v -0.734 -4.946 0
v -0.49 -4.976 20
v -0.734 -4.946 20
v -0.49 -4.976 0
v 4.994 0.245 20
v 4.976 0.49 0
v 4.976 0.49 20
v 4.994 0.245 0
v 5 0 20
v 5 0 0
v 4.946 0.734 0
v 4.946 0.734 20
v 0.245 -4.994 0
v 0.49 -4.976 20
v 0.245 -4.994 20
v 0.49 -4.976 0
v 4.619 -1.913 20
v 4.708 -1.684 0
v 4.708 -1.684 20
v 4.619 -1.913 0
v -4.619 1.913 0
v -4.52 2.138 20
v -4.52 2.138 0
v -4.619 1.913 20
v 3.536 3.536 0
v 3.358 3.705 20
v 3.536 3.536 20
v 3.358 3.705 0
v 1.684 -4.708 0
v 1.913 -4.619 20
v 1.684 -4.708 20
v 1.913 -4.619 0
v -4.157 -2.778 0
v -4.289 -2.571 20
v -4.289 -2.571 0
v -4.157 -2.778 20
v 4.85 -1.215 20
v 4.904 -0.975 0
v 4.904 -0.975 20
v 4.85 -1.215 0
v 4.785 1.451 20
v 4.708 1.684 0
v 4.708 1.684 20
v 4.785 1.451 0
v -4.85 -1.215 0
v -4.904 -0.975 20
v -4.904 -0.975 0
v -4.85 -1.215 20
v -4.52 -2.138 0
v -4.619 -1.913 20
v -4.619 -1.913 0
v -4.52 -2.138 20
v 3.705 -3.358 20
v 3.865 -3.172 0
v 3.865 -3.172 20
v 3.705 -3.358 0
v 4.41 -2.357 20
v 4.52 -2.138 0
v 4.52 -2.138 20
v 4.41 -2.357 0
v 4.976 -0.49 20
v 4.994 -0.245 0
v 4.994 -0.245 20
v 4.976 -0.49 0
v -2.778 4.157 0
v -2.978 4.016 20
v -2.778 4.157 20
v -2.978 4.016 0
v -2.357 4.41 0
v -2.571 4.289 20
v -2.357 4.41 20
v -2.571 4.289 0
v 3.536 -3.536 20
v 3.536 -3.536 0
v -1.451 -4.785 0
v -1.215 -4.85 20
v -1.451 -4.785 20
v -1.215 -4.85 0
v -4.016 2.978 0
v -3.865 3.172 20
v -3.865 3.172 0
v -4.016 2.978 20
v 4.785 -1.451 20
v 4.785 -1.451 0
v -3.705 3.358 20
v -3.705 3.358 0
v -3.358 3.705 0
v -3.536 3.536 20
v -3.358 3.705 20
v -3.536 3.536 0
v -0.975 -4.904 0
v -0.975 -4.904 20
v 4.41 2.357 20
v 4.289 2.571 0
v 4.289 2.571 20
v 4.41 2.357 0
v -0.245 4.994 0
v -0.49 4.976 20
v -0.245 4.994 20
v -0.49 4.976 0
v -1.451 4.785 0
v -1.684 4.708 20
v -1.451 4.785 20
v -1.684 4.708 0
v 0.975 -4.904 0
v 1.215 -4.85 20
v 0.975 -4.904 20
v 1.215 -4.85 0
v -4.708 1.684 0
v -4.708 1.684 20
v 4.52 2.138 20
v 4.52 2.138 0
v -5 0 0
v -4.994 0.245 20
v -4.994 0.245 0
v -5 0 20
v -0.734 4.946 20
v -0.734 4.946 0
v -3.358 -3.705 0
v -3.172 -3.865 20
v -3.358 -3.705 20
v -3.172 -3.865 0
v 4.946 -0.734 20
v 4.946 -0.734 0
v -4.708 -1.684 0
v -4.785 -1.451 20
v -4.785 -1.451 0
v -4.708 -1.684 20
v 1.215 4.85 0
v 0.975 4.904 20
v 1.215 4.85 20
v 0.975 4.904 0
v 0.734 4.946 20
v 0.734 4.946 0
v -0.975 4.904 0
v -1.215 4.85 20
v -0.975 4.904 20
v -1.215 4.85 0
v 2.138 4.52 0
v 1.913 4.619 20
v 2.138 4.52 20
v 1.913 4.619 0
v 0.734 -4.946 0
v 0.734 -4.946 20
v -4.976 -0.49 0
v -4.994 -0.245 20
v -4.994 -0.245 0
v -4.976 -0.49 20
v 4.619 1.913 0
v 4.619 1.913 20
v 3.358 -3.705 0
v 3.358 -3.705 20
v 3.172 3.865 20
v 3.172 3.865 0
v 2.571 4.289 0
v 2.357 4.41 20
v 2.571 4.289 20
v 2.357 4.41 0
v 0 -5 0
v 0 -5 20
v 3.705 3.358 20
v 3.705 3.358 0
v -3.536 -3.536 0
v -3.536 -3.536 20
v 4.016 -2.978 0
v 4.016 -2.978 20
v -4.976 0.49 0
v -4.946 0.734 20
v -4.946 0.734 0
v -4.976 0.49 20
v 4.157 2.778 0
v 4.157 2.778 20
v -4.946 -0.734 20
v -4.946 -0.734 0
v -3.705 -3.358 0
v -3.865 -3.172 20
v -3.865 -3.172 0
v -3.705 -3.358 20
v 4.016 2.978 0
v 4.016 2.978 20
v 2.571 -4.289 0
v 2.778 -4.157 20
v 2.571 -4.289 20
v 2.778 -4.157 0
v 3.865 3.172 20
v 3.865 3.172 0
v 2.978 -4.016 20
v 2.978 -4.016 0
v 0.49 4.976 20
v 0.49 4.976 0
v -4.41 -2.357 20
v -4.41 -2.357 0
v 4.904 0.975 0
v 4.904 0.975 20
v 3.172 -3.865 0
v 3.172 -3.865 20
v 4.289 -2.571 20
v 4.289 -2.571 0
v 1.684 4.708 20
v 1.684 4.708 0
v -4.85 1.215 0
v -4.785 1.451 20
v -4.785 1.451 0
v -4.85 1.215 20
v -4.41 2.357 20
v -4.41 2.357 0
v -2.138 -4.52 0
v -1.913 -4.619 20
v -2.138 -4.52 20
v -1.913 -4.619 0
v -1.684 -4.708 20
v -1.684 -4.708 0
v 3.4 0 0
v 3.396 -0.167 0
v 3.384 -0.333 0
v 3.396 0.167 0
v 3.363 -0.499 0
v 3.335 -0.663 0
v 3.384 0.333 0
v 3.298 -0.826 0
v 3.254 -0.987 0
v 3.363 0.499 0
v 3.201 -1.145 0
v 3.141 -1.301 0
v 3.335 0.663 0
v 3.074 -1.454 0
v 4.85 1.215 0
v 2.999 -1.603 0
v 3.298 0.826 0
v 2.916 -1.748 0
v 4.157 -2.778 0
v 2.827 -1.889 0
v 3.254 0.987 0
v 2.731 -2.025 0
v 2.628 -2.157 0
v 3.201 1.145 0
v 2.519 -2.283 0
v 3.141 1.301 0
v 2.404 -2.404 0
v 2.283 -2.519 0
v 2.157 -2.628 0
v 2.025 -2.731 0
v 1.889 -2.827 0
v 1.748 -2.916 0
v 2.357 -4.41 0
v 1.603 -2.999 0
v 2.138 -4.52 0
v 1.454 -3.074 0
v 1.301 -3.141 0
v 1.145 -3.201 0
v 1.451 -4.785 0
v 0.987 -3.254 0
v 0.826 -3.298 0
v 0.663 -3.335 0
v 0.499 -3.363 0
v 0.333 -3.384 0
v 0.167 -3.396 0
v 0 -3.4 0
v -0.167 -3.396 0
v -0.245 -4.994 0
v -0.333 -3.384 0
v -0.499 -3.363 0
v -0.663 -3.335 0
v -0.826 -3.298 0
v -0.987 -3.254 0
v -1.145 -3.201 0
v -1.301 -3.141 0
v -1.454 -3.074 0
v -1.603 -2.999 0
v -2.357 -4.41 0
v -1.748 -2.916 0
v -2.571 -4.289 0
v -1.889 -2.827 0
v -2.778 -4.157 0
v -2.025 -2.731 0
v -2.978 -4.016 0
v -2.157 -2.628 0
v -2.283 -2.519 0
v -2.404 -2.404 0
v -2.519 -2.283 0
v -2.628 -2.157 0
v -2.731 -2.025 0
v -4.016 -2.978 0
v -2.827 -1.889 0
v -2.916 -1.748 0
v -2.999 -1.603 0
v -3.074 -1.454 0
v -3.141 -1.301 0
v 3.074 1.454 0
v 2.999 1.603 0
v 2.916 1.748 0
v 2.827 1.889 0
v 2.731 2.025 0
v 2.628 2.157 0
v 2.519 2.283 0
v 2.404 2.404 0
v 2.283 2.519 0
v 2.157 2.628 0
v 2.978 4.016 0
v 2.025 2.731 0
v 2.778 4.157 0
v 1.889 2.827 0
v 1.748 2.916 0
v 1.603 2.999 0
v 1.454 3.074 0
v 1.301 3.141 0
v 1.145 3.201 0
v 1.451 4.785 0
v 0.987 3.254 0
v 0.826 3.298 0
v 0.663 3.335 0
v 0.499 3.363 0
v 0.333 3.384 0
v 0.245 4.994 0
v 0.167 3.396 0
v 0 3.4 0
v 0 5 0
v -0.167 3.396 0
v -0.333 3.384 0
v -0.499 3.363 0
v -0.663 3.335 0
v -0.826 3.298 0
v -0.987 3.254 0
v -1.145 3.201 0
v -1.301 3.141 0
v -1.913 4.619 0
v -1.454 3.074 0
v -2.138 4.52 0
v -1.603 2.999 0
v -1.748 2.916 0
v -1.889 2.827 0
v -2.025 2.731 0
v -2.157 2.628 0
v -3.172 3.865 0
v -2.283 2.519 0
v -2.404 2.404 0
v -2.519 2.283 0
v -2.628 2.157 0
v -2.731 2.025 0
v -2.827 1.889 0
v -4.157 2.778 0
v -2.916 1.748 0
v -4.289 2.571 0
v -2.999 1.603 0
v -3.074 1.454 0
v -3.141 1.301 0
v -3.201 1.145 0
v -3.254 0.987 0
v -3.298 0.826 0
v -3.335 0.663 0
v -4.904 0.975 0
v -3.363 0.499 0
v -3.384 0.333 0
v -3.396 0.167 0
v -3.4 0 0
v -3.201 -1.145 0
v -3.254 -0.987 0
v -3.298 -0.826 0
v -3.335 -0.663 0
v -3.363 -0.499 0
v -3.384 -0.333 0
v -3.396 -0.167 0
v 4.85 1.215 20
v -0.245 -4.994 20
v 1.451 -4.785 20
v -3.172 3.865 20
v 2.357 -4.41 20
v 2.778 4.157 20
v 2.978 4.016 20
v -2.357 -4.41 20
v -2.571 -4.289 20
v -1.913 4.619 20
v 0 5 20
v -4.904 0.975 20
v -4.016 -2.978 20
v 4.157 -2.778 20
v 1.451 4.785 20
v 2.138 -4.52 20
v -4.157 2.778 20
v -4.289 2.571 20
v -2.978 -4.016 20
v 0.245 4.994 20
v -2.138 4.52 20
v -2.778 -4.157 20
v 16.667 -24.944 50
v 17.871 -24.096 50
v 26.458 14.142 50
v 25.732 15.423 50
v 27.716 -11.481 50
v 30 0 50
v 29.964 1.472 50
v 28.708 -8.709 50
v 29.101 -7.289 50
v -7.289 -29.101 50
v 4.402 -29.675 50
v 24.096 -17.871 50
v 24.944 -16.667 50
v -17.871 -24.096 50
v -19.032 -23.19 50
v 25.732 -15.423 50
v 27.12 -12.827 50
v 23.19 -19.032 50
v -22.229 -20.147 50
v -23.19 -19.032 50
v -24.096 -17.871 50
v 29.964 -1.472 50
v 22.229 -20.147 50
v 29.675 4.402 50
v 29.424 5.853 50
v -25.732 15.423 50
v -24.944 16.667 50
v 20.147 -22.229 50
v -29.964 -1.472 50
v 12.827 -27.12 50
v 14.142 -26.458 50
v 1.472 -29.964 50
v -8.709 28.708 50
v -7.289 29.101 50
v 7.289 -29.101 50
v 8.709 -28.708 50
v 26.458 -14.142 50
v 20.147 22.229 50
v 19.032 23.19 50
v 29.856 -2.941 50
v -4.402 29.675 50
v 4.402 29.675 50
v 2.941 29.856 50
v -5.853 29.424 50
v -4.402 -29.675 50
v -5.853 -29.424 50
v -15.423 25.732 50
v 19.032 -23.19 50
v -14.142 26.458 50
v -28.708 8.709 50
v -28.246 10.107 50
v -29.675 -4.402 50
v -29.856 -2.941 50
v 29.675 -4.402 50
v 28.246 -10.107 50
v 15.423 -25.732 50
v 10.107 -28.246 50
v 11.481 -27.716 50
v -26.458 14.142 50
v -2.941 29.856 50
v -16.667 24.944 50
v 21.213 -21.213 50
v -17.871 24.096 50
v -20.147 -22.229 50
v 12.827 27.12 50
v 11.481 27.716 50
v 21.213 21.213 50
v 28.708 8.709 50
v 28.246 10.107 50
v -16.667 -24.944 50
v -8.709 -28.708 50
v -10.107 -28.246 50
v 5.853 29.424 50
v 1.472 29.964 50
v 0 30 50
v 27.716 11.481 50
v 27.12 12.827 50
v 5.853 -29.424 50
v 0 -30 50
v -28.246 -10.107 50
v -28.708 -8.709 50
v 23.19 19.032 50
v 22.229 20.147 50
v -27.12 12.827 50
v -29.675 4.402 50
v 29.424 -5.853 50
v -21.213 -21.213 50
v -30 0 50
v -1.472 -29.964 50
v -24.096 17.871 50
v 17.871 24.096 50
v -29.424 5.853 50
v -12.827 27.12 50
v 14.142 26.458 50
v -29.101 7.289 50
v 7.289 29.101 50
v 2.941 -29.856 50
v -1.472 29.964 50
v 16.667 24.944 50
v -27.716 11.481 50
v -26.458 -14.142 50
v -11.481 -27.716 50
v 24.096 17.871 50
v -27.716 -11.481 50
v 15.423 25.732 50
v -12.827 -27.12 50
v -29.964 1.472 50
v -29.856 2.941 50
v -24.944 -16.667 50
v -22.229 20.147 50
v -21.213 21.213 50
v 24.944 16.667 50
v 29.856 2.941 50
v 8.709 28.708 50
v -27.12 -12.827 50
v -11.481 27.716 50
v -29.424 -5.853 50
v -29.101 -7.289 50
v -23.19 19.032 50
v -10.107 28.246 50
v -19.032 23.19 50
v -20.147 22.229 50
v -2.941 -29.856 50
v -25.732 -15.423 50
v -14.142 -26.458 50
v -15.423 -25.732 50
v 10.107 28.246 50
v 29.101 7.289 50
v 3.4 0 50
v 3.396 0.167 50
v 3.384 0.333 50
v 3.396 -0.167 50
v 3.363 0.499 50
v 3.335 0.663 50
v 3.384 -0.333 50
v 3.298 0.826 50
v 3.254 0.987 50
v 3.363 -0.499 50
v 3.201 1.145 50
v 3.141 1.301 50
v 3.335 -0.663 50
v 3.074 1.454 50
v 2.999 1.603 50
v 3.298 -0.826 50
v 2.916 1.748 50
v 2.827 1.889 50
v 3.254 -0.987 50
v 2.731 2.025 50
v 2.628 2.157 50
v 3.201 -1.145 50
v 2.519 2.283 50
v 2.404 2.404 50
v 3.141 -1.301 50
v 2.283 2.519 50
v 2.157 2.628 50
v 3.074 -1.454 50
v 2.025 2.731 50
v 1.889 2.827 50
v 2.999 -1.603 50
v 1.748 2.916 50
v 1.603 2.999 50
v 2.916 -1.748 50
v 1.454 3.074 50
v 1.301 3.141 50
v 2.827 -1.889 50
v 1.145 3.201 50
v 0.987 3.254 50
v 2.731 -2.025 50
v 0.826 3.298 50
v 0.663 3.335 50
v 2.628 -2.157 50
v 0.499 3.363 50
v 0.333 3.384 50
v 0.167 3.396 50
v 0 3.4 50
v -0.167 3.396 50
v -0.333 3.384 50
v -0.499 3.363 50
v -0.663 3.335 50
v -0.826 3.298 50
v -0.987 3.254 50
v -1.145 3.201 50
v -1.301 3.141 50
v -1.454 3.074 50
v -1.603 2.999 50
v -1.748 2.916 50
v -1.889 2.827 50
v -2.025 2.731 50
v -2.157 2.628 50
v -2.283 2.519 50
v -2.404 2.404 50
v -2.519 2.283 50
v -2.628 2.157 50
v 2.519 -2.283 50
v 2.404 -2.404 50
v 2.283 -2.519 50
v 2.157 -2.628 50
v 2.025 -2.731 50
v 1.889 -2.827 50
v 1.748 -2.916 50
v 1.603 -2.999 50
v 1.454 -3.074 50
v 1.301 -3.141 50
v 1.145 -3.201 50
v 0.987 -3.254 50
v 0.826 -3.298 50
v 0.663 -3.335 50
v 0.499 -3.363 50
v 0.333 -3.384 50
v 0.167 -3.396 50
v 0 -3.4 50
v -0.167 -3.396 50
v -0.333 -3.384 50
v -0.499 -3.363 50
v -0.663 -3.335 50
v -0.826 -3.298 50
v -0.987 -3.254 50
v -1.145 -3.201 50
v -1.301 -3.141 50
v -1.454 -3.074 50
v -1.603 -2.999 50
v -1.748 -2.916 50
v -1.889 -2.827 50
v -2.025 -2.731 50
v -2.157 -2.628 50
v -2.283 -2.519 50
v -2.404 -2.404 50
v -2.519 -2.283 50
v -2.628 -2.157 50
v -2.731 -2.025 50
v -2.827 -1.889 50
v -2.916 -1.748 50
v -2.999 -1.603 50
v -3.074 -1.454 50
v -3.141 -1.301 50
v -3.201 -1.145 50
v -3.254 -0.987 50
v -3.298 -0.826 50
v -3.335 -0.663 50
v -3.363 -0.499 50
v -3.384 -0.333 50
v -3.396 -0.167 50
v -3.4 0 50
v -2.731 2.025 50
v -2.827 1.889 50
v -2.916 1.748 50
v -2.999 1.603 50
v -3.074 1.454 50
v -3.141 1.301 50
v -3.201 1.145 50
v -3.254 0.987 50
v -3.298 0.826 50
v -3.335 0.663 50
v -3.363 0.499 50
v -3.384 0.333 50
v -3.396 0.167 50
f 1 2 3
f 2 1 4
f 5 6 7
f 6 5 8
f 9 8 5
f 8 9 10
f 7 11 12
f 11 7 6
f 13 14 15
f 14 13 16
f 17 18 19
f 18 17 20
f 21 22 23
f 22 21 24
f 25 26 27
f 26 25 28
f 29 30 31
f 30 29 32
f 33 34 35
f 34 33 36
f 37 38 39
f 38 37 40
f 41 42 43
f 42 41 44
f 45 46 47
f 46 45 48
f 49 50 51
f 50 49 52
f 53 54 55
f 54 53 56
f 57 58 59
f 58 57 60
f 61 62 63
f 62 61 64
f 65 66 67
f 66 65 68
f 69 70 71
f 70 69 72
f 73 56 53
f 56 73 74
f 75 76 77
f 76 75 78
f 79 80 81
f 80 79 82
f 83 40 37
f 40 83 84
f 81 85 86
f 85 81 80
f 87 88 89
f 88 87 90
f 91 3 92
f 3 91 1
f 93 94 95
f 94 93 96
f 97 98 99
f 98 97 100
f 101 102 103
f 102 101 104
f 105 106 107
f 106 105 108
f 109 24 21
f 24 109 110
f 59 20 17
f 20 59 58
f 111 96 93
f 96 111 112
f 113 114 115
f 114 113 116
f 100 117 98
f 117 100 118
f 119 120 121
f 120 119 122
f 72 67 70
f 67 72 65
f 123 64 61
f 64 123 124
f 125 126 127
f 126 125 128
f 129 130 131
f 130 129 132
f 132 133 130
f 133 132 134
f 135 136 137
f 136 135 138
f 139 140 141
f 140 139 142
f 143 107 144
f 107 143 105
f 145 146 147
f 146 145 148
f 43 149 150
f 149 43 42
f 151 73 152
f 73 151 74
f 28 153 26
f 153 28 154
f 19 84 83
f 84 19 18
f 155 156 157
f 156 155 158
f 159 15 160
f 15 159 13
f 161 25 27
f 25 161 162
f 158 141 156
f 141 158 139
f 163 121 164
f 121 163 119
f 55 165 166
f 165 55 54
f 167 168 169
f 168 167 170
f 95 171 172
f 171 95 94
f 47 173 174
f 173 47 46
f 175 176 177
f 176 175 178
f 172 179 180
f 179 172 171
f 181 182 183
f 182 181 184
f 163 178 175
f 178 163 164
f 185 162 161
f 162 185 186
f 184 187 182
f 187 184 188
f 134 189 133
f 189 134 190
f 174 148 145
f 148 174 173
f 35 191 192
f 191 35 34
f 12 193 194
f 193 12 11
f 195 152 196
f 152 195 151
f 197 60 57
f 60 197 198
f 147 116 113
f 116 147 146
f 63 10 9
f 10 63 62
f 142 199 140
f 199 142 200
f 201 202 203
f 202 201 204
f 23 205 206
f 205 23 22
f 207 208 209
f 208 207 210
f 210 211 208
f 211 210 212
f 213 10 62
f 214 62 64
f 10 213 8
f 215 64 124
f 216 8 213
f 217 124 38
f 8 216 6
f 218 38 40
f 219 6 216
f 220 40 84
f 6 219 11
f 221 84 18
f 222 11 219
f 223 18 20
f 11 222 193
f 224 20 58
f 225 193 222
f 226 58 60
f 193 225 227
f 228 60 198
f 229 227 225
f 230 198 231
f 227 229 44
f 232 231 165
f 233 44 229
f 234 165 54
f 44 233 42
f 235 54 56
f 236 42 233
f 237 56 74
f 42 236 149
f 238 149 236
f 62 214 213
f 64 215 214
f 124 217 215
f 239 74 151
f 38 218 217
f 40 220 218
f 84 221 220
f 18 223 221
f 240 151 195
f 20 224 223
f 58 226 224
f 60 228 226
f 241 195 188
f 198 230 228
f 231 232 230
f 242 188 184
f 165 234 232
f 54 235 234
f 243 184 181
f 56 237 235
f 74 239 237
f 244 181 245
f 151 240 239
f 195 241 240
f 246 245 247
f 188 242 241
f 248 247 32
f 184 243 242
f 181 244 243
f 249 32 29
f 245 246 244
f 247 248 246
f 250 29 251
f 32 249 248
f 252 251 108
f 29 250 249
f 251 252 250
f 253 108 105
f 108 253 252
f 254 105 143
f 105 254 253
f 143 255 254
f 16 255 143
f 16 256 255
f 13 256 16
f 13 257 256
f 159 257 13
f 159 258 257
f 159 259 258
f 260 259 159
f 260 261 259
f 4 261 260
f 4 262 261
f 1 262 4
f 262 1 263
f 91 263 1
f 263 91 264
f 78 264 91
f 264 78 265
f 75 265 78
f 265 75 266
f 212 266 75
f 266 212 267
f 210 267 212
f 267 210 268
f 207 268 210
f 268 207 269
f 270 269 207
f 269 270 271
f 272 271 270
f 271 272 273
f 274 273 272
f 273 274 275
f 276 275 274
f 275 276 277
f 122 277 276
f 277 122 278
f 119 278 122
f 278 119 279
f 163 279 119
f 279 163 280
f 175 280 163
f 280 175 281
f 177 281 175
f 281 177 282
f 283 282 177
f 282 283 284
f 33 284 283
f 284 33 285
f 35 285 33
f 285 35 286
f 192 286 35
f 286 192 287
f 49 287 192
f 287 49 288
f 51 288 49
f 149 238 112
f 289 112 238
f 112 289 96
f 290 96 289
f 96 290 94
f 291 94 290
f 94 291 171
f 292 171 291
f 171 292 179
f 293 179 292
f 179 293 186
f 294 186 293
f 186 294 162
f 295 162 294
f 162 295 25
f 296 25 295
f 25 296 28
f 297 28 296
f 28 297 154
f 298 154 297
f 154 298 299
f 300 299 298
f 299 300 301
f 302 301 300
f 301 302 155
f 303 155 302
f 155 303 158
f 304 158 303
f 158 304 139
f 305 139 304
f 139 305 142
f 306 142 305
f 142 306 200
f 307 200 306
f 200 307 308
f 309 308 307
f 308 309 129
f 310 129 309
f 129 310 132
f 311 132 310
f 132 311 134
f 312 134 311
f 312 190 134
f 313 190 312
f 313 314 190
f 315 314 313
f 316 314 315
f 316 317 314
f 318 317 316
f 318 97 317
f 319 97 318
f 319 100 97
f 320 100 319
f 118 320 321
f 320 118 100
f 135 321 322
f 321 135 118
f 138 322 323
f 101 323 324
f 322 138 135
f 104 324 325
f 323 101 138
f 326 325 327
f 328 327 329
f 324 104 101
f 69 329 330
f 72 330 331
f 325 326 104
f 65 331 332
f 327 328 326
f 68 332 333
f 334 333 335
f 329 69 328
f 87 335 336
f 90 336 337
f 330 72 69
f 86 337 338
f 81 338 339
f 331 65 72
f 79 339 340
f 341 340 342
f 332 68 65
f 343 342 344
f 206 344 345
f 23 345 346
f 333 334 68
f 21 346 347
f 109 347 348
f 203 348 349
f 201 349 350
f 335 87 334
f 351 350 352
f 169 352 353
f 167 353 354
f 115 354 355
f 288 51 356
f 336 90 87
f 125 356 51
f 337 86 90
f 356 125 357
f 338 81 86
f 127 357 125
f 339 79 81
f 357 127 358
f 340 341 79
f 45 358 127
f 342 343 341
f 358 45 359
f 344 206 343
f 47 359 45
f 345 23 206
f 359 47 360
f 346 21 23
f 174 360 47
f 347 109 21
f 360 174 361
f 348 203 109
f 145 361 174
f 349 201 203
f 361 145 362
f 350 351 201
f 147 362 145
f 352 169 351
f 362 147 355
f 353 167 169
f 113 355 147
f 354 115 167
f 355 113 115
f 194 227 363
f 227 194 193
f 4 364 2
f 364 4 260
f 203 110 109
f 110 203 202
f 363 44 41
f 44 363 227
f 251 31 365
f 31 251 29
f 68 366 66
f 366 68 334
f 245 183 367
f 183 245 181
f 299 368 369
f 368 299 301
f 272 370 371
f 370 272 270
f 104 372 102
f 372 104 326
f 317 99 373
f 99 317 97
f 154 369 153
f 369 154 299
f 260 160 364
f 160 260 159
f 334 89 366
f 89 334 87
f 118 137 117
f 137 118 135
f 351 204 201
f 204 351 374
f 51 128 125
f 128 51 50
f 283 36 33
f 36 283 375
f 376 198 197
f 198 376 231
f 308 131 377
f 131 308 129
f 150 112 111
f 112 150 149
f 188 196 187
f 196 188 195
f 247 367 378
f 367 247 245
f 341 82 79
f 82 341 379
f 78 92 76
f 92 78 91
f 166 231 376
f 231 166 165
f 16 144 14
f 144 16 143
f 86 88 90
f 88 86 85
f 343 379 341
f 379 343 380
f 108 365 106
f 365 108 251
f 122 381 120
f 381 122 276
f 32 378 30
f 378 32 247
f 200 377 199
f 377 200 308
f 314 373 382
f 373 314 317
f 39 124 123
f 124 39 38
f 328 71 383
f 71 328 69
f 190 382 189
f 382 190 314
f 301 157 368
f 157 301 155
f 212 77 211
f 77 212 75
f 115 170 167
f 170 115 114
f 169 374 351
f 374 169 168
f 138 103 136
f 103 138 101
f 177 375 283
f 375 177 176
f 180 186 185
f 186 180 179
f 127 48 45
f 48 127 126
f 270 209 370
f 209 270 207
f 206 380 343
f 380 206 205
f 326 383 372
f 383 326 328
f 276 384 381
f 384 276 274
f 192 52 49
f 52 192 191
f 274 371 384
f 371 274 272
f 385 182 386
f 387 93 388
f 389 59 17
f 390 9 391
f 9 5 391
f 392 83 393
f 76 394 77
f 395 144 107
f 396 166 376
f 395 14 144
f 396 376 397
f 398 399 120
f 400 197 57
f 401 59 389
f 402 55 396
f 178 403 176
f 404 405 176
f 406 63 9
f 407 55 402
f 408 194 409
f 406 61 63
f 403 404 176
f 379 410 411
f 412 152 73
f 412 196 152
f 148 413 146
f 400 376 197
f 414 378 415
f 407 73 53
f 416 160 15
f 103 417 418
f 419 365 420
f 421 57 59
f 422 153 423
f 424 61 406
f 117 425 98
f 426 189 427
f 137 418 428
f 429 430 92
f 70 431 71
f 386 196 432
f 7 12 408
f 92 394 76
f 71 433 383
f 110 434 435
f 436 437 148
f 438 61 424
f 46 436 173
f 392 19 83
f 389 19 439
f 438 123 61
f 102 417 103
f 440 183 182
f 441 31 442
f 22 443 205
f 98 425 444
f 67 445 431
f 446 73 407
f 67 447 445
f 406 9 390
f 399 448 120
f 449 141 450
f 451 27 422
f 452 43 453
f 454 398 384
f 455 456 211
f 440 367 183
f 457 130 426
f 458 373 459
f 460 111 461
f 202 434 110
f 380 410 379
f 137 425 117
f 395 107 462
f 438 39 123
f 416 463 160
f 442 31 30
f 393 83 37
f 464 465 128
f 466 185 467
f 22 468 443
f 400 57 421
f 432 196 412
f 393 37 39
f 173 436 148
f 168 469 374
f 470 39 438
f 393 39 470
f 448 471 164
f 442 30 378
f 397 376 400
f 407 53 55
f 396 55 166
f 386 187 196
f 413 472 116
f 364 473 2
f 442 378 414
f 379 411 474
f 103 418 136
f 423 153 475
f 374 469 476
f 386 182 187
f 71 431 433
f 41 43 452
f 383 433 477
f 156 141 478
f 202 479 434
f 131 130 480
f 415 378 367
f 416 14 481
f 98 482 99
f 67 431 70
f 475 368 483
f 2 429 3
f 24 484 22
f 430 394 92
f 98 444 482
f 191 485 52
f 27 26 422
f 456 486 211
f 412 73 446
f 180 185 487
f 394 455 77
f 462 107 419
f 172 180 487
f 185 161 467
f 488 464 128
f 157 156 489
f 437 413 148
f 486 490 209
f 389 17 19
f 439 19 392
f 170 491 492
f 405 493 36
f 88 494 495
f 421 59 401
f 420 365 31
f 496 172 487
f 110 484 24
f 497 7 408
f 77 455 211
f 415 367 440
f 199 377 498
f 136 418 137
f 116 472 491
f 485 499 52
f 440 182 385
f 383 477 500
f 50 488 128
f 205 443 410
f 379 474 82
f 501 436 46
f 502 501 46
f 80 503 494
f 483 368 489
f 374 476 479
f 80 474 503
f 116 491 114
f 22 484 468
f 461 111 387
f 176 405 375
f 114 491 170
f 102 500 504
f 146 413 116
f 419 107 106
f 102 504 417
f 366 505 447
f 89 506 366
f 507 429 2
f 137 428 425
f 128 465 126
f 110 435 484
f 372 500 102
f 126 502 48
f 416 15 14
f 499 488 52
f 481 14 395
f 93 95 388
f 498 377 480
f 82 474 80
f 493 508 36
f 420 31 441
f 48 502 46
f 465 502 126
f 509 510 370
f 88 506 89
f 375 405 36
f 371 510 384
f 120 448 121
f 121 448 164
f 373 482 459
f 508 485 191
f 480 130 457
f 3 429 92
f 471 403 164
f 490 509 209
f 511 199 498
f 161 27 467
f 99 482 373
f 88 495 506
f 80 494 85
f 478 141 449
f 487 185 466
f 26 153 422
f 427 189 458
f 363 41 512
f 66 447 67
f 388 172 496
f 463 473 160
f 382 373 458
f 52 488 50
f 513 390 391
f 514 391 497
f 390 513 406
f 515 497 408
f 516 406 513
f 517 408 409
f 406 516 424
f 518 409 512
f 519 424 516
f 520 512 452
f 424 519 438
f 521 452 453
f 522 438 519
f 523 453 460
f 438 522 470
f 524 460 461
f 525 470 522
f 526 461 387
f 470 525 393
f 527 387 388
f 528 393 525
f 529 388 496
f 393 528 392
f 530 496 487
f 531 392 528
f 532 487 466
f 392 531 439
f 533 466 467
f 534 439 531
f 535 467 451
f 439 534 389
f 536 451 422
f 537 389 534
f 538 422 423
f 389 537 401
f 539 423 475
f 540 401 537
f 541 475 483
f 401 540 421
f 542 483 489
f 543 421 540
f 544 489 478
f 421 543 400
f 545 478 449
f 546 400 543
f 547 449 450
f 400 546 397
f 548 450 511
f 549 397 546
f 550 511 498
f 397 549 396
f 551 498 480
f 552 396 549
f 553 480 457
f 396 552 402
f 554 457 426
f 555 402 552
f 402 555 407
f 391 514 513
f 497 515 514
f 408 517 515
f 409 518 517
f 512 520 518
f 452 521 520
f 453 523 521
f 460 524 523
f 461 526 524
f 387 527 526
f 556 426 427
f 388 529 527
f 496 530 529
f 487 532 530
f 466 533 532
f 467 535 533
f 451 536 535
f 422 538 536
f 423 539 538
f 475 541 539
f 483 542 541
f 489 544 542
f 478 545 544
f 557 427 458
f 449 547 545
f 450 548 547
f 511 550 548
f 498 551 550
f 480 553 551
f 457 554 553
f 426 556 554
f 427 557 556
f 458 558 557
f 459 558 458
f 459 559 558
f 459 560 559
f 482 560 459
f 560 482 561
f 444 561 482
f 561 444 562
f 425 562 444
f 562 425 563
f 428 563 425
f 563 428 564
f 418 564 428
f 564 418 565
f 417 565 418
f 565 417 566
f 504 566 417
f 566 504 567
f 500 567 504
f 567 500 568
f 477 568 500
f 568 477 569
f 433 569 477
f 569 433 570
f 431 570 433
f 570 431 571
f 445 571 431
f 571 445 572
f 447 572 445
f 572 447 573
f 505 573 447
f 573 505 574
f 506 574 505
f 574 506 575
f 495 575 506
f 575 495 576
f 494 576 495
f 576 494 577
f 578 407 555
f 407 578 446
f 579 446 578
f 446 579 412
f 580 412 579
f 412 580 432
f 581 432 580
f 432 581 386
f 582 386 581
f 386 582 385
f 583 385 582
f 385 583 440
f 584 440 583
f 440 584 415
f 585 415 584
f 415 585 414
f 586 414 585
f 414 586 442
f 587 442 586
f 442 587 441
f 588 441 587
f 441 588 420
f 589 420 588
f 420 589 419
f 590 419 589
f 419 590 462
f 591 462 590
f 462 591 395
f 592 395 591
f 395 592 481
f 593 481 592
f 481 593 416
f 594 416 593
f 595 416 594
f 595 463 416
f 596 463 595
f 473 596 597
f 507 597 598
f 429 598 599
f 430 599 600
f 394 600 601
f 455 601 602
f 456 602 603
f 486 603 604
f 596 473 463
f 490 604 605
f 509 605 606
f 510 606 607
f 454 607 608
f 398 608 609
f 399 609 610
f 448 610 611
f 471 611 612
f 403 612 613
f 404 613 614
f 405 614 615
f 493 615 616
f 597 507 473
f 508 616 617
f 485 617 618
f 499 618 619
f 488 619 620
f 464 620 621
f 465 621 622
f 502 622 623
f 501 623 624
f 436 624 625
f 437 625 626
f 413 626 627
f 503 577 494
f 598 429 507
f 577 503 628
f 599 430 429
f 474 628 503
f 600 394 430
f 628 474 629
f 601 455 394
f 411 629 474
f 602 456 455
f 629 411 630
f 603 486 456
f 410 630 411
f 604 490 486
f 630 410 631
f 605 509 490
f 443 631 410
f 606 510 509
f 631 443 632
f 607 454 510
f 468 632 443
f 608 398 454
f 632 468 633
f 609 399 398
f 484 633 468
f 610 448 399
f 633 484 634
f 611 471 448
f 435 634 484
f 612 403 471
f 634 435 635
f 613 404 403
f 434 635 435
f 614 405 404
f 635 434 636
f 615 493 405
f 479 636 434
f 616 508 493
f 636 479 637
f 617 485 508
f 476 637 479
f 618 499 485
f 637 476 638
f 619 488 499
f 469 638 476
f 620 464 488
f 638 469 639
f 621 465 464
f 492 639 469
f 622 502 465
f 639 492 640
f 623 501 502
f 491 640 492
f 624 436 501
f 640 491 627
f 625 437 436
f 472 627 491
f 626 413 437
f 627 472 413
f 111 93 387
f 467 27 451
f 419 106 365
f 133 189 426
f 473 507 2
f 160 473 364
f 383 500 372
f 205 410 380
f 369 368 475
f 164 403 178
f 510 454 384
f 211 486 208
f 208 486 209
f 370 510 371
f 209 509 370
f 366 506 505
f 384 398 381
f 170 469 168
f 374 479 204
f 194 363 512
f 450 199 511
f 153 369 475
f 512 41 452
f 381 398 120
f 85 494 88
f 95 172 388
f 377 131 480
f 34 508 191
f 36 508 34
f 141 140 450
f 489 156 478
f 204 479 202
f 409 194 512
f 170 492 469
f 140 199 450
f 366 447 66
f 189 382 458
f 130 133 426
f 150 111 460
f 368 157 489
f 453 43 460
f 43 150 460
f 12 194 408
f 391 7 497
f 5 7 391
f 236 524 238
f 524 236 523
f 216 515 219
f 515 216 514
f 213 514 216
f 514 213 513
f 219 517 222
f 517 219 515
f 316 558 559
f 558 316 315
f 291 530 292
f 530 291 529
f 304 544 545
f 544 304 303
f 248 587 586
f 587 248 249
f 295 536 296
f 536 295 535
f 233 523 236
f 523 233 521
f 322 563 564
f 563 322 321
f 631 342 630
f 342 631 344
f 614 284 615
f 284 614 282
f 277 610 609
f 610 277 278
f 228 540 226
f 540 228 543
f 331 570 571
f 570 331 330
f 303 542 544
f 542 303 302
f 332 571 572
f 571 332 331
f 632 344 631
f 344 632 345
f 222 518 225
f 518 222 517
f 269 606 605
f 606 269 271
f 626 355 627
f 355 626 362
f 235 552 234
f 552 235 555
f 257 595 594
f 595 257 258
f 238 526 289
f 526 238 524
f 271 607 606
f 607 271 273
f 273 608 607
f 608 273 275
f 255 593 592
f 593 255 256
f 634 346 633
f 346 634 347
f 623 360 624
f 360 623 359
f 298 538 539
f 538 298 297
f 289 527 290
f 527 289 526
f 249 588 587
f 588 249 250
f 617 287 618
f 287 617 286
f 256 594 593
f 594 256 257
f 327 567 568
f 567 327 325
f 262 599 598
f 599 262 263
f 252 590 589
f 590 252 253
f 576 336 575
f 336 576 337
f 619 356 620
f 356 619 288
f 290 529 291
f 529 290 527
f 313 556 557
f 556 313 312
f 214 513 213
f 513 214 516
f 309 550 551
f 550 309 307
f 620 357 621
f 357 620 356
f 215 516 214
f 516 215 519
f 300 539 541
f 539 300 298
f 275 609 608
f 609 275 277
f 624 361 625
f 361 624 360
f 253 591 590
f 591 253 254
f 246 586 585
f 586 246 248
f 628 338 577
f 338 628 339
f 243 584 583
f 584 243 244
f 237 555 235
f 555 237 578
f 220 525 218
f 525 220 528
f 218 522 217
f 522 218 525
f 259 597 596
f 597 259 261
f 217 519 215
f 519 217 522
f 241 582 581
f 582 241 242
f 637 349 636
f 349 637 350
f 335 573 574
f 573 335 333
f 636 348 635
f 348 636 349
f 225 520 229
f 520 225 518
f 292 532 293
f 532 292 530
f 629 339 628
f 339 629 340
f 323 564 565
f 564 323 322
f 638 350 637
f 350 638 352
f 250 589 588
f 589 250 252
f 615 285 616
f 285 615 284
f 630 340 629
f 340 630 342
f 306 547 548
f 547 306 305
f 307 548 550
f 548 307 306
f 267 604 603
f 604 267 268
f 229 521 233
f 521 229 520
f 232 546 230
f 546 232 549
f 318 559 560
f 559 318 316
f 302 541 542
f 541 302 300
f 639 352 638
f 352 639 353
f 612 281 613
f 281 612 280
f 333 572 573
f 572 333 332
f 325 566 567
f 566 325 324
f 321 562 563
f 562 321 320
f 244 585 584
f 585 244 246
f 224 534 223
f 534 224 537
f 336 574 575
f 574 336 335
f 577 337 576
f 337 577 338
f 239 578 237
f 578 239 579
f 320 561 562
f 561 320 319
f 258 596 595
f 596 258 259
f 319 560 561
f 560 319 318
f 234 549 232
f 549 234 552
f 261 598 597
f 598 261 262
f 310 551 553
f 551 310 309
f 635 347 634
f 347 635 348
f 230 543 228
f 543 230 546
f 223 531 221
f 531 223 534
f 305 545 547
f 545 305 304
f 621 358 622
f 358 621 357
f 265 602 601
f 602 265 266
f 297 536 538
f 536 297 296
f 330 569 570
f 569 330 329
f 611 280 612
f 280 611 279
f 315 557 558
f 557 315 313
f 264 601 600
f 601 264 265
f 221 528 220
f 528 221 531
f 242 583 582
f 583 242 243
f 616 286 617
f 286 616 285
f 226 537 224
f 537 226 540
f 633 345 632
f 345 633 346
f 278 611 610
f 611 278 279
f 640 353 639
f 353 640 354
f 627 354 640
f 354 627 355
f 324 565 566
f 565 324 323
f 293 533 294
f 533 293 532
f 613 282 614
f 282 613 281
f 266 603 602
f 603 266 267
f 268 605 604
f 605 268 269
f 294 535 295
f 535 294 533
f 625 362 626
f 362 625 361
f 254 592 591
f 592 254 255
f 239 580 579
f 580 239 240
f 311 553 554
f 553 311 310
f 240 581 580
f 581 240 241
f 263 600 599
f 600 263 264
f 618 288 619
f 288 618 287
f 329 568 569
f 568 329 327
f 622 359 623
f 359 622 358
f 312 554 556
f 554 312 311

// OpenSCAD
// Small lab funnel - printed upright, open top and bottom
// Units: mm. One complete part, no external libraries.

// ---- Parameters ----
spout_od      = 10;    // spout outer diameter
spout_length  = 20;    // spout runs from z = 0 to z = 20
cone_bottom_d = 10;    // cone outer diameter at z = 20 (spout top)
cone_top_d    = 60;    // cone outer diameter at rim (z = 50)
cone_top_z    = 50;    // rim height
wall          = 1.6;   // uniform wall thickness (spout bore = 6.8 mm)
eps           = 0.5;   // cutter overshoot past faces

$fn = 128;             // smoothness of curved surfaces

// ---- Derived ----
cone_height = cone_top_z - spout_length;   // 30 mm
// ---- Model ----
difference() {
    union() {
        // Spout: straight tube from z = 0 to z = 20
        cylinder(d = spout_od, h = spout_length);

        // Cone: widens from 10 mm at z = 20 to 60 mm at z = 50
        translate([0, 0, spout_length])
            cylinder(d1 = cone_bottom_d, d2 = cone_top_d, h = cone_height);
    }
    // Through-bore: 6.8 mm from bottom to rim (open top and bottom)
    translate([0, 0, -eps])
        cylinder(d = spout_od - 2 * wall, h = cone_top_z + 2 * eps);
}
